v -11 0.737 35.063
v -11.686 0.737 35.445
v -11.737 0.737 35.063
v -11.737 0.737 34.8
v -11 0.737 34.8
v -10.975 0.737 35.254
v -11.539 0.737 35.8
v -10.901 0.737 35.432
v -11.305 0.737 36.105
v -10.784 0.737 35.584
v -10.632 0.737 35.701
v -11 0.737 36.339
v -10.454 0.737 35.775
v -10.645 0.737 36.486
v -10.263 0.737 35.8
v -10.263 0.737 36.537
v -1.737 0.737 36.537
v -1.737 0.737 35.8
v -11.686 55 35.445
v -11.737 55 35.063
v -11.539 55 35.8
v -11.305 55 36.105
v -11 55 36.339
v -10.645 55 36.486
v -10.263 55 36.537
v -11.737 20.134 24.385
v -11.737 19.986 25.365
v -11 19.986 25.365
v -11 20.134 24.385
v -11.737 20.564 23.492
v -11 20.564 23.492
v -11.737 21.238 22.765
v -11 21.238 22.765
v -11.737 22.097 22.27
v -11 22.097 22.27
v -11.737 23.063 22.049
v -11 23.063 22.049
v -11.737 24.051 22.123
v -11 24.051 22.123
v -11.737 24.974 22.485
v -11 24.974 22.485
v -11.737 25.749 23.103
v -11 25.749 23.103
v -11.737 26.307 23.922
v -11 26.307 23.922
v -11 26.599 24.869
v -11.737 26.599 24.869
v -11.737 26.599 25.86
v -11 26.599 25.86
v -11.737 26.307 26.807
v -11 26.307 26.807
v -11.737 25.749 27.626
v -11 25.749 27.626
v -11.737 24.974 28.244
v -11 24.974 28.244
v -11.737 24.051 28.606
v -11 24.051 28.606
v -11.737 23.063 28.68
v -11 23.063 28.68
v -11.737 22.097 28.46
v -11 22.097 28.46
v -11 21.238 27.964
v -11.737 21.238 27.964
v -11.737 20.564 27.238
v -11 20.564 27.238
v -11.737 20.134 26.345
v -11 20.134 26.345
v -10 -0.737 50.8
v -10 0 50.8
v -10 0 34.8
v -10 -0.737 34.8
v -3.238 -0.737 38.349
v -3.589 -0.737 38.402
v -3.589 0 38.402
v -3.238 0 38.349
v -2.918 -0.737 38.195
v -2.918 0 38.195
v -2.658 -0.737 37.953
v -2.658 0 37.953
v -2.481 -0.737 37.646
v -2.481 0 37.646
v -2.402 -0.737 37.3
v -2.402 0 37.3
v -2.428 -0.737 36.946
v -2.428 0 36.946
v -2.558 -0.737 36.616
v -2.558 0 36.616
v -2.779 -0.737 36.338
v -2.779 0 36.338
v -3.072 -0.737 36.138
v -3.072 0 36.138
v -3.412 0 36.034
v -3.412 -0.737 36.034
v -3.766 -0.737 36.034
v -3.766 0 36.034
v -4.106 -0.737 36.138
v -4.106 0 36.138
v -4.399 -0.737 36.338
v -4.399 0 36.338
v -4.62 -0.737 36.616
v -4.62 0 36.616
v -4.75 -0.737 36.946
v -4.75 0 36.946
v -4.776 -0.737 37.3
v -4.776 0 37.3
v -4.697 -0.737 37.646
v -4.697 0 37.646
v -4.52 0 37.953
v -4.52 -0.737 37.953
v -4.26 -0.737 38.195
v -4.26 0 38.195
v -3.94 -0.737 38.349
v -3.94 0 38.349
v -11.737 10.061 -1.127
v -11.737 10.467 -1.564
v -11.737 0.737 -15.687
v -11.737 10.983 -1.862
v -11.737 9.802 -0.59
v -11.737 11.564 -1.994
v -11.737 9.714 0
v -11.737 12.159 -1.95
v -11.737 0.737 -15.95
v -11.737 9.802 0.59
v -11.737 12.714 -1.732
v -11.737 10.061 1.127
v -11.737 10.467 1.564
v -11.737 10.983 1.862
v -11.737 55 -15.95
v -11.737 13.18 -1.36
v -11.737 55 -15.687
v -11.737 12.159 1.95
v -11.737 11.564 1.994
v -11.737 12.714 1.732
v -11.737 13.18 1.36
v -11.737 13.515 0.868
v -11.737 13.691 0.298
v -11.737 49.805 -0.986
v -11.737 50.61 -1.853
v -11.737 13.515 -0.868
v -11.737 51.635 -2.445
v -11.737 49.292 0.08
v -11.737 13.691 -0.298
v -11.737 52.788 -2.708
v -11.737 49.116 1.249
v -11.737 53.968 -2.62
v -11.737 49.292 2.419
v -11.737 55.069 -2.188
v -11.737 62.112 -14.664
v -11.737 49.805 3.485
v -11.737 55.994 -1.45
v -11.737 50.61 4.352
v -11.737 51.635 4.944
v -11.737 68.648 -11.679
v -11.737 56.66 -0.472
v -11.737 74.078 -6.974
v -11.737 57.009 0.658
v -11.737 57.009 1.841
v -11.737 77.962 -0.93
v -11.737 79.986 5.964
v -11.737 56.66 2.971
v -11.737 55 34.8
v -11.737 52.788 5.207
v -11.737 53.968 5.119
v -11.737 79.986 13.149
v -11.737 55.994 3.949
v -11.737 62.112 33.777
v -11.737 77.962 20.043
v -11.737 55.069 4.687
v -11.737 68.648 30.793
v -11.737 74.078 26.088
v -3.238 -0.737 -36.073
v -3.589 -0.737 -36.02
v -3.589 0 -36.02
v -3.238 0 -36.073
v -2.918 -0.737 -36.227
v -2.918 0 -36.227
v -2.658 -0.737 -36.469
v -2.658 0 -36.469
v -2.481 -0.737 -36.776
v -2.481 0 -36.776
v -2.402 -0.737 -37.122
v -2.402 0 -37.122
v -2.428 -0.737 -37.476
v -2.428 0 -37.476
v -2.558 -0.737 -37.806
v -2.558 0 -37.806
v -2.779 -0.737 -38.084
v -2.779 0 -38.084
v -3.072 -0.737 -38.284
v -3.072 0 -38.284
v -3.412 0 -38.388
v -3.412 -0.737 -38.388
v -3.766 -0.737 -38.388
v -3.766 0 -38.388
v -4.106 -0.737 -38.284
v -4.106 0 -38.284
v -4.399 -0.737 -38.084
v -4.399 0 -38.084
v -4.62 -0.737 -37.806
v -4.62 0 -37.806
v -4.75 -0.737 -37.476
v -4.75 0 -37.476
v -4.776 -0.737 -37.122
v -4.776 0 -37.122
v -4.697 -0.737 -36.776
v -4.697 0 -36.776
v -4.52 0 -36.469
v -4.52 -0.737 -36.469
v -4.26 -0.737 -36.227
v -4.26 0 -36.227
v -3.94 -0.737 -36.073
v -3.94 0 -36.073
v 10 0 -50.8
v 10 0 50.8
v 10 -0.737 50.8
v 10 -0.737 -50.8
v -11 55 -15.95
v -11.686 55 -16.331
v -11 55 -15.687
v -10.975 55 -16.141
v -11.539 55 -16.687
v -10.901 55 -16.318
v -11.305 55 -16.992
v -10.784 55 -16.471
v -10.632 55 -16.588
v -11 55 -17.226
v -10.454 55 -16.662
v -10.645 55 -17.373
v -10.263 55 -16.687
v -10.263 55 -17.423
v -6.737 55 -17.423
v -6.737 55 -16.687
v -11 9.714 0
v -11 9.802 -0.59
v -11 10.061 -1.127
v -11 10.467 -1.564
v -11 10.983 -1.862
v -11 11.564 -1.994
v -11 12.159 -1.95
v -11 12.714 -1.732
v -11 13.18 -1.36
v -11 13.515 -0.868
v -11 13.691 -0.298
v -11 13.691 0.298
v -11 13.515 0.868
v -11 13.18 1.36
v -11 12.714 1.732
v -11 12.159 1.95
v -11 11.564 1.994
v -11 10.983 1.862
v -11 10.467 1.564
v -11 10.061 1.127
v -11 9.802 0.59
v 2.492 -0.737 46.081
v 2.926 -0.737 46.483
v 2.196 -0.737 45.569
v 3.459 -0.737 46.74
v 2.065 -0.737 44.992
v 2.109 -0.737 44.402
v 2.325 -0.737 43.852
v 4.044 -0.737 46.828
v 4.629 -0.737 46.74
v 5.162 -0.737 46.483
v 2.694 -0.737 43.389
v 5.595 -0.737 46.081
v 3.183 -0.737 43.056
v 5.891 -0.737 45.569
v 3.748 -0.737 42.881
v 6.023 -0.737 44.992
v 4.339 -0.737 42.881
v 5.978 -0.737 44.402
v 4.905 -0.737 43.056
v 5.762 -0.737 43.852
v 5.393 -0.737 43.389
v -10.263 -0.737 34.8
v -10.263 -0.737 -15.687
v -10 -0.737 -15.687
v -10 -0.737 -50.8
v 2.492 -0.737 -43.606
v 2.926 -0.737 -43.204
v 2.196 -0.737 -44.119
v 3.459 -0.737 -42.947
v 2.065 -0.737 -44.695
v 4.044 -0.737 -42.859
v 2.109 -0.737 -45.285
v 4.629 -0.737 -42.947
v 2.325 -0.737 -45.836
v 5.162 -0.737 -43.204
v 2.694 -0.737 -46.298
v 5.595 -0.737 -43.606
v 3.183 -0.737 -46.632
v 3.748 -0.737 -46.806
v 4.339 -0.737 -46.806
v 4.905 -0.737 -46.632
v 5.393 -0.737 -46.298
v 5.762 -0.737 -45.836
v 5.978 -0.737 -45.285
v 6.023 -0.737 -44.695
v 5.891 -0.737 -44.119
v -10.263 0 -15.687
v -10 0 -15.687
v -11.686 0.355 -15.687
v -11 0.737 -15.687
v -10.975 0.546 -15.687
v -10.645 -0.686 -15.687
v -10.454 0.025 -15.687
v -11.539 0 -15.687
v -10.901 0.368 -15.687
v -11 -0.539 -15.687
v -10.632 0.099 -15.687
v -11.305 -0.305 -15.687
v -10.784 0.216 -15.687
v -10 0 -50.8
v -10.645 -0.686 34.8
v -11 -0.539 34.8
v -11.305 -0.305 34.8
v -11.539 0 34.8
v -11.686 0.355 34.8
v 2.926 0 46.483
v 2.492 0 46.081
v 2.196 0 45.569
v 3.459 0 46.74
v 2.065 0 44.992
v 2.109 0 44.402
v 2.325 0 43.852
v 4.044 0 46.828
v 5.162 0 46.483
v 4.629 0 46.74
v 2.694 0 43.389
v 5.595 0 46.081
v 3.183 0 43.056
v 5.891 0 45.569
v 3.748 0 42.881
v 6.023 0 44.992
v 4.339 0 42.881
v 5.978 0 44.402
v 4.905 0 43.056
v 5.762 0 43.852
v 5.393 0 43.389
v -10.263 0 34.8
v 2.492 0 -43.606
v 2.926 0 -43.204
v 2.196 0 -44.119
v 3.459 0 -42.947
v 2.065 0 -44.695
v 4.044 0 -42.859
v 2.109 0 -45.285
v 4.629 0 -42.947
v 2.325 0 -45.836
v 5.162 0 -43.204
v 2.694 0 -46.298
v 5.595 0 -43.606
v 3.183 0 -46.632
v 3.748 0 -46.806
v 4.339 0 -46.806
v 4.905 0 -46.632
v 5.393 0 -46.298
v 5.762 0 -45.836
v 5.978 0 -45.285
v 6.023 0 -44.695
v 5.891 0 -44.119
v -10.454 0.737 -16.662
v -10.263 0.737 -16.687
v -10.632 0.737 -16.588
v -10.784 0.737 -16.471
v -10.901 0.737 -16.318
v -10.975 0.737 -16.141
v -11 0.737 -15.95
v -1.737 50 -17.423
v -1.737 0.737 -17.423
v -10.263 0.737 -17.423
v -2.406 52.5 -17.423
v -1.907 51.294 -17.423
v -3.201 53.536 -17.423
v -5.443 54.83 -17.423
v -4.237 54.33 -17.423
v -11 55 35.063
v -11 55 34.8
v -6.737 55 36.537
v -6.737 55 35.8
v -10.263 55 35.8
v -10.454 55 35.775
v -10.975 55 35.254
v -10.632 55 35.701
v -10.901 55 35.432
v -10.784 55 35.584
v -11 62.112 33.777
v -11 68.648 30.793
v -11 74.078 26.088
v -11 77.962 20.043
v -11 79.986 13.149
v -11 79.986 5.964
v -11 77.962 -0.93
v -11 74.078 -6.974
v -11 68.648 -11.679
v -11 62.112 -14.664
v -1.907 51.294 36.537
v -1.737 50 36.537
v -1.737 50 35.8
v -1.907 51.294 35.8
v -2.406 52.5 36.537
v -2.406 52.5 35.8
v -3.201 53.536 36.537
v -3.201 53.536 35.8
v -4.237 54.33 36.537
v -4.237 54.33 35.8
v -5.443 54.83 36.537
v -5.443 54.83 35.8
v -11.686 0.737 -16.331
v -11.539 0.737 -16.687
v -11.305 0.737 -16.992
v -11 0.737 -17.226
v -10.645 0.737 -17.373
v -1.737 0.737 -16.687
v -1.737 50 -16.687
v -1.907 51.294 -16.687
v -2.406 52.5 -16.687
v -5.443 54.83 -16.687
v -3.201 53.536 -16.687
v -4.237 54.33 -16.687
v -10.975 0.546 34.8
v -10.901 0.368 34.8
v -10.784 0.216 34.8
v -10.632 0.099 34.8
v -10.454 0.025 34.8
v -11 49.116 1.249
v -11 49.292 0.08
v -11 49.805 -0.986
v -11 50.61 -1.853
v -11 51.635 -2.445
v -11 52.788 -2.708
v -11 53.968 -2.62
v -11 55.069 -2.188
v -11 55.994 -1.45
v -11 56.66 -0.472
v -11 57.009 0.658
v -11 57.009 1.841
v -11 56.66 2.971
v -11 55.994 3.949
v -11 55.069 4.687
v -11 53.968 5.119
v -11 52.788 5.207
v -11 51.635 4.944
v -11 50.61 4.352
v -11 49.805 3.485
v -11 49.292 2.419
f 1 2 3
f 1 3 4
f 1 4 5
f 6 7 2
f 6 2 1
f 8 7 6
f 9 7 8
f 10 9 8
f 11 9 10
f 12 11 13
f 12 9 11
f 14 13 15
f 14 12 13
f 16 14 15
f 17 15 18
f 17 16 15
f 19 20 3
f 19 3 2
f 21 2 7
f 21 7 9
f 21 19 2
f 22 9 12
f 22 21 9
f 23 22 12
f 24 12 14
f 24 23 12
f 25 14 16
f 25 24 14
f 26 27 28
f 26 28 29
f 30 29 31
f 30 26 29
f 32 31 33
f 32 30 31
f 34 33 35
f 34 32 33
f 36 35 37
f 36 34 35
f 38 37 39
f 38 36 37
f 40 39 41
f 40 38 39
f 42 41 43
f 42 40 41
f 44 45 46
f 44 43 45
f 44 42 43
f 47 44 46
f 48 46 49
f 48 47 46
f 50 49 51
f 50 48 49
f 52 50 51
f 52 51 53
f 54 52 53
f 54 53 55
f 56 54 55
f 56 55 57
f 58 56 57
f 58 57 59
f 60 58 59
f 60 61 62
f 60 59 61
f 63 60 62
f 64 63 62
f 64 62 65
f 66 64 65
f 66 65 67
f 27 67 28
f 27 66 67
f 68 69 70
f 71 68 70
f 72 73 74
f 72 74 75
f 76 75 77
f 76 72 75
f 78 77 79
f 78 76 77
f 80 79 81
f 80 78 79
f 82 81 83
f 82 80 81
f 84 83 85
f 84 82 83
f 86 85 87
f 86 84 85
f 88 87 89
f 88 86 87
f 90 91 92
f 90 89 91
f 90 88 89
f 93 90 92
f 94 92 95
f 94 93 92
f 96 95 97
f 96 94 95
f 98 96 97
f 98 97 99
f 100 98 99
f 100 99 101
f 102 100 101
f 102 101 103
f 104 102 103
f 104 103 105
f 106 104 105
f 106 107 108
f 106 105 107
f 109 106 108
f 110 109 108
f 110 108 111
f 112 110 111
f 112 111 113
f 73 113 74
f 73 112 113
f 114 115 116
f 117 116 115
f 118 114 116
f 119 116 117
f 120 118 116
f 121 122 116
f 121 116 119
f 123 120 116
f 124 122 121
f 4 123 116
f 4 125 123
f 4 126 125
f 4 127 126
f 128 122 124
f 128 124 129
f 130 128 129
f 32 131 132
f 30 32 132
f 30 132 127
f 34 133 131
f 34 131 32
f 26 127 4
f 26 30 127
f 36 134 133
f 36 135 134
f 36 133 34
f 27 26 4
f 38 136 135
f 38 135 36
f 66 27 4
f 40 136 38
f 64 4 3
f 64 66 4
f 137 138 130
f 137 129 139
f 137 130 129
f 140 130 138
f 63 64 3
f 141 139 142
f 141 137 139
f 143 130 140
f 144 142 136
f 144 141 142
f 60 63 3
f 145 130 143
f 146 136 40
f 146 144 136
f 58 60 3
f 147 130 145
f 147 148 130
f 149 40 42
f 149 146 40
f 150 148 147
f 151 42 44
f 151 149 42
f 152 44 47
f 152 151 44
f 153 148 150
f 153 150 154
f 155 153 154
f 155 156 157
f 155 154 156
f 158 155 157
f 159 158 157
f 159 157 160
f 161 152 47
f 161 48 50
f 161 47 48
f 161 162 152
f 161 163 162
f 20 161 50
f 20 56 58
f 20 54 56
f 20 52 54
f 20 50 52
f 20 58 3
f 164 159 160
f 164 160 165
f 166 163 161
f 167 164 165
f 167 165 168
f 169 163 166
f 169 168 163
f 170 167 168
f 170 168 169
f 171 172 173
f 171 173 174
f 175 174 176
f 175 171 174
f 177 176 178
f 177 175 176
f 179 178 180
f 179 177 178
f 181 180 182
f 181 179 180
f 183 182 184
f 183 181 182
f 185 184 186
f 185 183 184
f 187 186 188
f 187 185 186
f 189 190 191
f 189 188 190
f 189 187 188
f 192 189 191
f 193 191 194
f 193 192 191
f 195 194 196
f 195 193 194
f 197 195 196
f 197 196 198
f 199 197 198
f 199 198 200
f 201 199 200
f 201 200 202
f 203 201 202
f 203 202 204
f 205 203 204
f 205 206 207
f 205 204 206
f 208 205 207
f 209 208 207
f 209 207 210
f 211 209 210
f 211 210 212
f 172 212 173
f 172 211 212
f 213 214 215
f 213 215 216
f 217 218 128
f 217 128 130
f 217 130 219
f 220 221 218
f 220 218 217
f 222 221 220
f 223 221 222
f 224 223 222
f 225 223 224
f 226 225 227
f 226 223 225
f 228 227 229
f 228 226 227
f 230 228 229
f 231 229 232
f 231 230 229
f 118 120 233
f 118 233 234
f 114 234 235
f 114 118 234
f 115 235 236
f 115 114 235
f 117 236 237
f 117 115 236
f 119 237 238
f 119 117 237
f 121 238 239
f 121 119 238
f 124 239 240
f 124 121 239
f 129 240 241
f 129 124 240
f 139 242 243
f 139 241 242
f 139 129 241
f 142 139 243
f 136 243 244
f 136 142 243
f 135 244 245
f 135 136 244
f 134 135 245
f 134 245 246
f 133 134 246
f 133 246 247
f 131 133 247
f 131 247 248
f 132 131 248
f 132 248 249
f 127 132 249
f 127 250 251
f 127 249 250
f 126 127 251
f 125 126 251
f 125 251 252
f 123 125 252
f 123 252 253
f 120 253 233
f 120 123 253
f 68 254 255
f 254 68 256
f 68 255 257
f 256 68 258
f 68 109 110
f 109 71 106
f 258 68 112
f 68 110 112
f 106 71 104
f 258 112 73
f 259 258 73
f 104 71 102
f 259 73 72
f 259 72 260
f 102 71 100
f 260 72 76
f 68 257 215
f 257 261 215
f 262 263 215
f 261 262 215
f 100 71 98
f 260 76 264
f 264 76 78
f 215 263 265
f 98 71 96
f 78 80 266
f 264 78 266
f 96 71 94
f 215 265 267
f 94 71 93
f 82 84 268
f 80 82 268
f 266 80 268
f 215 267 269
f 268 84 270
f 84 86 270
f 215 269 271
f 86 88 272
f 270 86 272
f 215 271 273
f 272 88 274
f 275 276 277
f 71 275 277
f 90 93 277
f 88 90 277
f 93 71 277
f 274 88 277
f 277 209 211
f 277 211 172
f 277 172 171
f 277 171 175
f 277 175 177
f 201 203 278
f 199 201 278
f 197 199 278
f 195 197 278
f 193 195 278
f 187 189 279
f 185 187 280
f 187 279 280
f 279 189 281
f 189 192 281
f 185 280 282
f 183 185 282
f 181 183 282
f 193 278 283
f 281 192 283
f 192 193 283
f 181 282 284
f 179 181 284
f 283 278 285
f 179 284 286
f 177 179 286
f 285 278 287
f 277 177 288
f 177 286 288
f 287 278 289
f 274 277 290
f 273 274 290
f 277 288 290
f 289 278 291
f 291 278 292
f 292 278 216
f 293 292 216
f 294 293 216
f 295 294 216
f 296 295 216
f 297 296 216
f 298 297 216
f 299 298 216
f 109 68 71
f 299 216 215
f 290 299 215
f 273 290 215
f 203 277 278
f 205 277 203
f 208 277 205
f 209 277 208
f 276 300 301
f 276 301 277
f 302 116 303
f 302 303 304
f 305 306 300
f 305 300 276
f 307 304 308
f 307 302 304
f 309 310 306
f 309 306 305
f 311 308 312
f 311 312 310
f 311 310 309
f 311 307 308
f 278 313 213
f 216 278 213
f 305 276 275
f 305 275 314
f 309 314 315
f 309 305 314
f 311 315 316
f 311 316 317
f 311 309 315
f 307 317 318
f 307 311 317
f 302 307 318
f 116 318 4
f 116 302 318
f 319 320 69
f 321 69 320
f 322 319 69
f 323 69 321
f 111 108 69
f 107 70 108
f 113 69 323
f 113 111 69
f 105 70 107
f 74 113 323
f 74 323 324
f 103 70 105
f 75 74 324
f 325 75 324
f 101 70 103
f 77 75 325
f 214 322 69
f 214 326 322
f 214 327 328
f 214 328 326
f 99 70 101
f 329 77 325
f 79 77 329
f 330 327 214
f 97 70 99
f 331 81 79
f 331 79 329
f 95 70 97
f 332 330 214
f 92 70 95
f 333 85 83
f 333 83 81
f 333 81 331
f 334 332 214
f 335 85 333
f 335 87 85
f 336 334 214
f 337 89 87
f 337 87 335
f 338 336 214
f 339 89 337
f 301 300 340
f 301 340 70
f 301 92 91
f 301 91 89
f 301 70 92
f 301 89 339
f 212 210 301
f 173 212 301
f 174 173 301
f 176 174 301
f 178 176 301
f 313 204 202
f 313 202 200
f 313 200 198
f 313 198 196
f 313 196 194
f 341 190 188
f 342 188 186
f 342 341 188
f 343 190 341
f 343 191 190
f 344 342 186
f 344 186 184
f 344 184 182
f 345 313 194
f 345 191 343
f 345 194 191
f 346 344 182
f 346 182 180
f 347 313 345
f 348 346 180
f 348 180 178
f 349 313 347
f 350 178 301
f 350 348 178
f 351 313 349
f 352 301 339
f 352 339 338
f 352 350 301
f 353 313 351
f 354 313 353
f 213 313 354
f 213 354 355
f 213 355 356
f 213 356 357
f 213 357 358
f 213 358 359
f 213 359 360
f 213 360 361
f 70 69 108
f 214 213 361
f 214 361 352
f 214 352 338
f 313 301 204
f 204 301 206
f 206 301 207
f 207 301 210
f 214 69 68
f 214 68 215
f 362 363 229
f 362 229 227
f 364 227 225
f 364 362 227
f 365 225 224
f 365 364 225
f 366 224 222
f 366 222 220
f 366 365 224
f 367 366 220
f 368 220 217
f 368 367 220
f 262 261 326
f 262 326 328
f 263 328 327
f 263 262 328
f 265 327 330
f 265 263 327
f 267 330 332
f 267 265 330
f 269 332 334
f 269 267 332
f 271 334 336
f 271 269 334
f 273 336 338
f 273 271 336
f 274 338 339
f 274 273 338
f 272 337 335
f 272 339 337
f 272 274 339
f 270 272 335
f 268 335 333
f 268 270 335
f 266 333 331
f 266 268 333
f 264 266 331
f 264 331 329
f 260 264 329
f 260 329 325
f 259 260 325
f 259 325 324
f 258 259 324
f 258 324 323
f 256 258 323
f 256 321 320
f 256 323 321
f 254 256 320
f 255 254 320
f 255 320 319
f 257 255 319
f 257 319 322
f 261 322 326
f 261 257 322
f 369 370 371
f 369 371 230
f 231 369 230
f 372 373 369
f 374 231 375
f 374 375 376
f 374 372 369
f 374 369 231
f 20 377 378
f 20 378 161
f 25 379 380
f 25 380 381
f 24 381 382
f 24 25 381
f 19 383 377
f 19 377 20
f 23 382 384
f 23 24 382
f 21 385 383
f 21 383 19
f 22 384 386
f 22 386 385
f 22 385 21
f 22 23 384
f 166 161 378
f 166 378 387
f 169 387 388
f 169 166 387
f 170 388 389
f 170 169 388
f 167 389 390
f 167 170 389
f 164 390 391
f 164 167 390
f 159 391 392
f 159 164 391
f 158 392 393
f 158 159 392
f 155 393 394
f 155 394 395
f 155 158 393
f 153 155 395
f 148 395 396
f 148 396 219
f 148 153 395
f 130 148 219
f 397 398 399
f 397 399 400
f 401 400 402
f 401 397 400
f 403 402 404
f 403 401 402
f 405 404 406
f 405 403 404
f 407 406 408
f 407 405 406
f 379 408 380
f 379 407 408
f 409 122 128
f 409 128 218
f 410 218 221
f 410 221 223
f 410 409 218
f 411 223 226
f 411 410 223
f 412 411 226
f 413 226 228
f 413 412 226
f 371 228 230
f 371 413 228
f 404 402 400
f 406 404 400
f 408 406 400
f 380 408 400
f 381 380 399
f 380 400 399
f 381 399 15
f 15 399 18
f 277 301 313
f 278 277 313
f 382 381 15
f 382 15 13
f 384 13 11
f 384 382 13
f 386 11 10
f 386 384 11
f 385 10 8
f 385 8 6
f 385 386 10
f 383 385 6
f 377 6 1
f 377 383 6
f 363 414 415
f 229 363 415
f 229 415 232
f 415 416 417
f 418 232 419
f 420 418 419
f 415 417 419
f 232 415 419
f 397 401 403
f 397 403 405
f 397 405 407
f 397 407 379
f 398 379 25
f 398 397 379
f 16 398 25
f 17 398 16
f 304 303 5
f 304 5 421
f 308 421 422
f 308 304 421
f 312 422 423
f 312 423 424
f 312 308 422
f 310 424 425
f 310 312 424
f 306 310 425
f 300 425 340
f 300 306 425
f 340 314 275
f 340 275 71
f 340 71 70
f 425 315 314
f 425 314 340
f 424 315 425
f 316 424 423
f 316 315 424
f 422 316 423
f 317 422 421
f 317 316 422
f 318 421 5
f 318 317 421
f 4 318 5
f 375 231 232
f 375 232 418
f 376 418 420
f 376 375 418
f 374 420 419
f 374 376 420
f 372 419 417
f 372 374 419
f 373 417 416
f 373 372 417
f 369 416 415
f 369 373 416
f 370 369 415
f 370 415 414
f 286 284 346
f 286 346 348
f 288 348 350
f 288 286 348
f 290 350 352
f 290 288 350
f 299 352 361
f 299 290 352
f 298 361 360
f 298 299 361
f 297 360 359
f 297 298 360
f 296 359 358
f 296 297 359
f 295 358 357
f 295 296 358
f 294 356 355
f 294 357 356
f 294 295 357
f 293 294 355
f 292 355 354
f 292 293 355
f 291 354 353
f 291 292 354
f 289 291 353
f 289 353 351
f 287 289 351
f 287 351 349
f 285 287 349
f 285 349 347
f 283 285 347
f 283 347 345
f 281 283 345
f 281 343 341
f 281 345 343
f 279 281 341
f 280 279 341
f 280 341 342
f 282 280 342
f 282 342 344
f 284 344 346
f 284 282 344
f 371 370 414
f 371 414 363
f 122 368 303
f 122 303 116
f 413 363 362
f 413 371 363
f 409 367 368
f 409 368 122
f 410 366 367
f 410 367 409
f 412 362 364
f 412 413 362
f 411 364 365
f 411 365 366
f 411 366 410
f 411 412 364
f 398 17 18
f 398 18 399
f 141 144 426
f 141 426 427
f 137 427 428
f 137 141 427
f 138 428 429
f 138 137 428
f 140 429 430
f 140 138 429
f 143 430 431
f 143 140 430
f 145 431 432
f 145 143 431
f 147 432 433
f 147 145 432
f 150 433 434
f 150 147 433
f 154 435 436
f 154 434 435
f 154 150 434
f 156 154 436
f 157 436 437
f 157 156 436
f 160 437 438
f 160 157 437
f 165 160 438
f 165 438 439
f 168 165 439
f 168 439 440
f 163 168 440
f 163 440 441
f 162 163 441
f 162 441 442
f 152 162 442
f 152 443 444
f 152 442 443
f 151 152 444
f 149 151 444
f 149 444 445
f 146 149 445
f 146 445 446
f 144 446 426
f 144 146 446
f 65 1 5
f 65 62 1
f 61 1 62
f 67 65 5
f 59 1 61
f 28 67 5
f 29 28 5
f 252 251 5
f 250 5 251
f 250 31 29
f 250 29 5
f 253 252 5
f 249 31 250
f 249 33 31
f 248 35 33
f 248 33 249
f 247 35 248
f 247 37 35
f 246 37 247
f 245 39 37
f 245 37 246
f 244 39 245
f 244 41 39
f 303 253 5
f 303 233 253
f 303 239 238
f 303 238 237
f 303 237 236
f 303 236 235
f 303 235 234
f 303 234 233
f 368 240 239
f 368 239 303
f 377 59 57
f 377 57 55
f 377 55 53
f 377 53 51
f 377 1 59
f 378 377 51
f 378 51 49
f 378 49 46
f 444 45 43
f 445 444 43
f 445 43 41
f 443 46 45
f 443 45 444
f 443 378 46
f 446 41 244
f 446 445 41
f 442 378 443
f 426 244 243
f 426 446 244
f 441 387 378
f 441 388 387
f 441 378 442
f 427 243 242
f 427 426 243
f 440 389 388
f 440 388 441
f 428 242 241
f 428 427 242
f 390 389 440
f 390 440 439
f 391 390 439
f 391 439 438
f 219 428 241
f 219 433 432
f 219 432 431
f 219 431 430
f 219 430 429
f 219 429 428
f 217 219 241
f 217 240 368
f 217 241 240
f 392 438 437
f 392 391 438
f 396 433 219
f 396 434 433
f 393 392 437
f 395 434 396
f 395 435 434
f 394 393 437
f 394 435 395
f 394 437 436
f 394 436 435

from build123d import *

# Parameters (mm, degrees)
SKETCH1_W                 = 20
SKETCH1_H                 = 101.6
BASE_FLANGE1_DEPTH        = 0.7366
EDGE_FLANGE1_DEPTH        = 50.486713846
EDGE_FLANGE1_START        = 0.7366
EDGE_FLANGE1_FLAT_DEPTH   = 0.7366
CUT_EXTRUDE1_DEPTH        = 245.392554313
CUT_EXTRUDE1_DEPTH_BACK   = 245.392554313
SKETCH9_R                 = 2
CUT_EXTRUDE3_DEPTH        = 248.026355859
CUT_EXTRUDE3_DEPTH_BACK   = 248.026355859
SKETCH11_R                = 3.96875
CUT_EXTRUDE5_DEPTH        = 199.550344579
CUT_EXTRUDE5_DEPTH_BACK   = 199.550344579
SKETCH13_R                = 1.984375
SKETCH13_R_2              = 1.190625
EDGE_FLANGE2_DEPTH        = 54.2634
EDGE_FLANGE2_START        = 0.7366
EDGE_FLANGE2_FLAT_DEPTH   = 0.7366
EDGE_FLANGE2_BEND_DEPTH   = 54.2634
EDGE_FLANGE2_FLAT_2_DEPTH = 0.7366
CUT_EXTRUDE35_DEPTH       = 251.457429571
CUT_EXTRUDE35_DEPTH_BACK  = 251.457429571
SKETCH50_R                = 3.325000001


# Sheet-metal steps are written as plain solids
with BuildPart() as part:
    # Sketch1 → Base-Flange1 (new body)
    with BuildSketch(Plane(origin=(0, 0, 0), x_dir=(1, 0, 0), z_dir=(0, 1, 0))):
        Rectangle(SKETCH1_W, SKETCH1_H)
    extrude(amount=-BASE_FLANGE1_DEPTH)

    # Edge-Flange1 bend section (across the edge) → Edge-Flange1 (add)
    with BuildSketch(Plane(origin=(-11, 0, -15.686713846), x_dir=(1, 0, 0), z_dir=(0, 0, 1))):
        with BuildLine():
            Line((-0.7366, 0.7366), (0, 0.7366))
            ThreePointArc((0, 0.7366), (0.215745145, 0.215745145), (0.7366, 0))
            Line((0.7366, 0), (1, 0))
            Line((1, 0), (1, -0.7366))
            Line((1, -0.7366), (0.7366, -0.7366))
            ThreePointArc((0.7366, -0.7366), (-0.30510971, -0.30510971), (-0.7366, 0.7366))
        make_face()
    extrude(amount=EDGE_FLANGE1_DEPTH)

    # Edge-Flange1 profile (on flange) → Edge-Flange1 flat (add)
    with BuildSketch(Plane.ZY.offset(11).offset(EDGE_FLANGE1_START)):
        with BuildLine():
            ThreePointArc((34.8, 55), (9.556643077, 80.243356923), (-15.686713846, 55))
            Line((-15.686713846, 55), (-15.686713846, 0.7366))
            Line((-15.686713846, 0.7366), (34.8, 0.7366))
            Line((34.8, 0.7366), (34.8, 55))
        make_face()
    extrude(amount=-EDGE_FLANGE1_FLAT_DEPTH)

    # Sketch9 → Cut-Extrude1 (cut, two sides: drawn at the far end of the back side and taken through both)
    with BuildSketch(Plane(origin=(-48.111610167, -124.793980752, 68.826299478), x_dir=(0, 0, -1), z_dir=(1, 0, 0)).offset(-CUT_EXTRUDE1_DEPTH_BACK)):
        with Locations(Location((68.826299478, 136.507533033, 0), (0, 0, 270))):
            Circle(SKETCH9_R)
    extrude(amount=CUT_EXTRUDE1_DEPTH + CUT_EXTRUDE1_DEPTH_BACK, mode=Mode.SUBTRACT)

    # Sketch11 → Cut-Extrude3 (cut, two sides: drawn at the far end of the back side and taken through both)
    with BuildSketch(Plane(origin=(-58.346610167, -124.793980752, 68.826299478), x_dir=(0, 0, -1), z_dir=(1, 0, 0)).offset(-CUT_EXTRUDE3_DEPTH_BACK)):
        with Locations(Location((67.576820433, 177.878571709, 0), (0, 0, 270))):
            Circle(SKETCH11_R)
    extrude(amount=CUT_EXTRUDE3_DEPTH + CUT_EXTRUDE3_DEPTH_BACK, mode=Mode.SUBTRACT)

    # Sketch13 → Cut-Extrude5 (cut, two sides: drawn at the far end of the back side and taken through both)
    with BuildSketch(Plane(origin=(124.911822879, 0, 68.826299478), x_dir=(-0.7071067811865436, 0, 0.7071067811865515), z_dir=(0, 1, 0)).offset(-CUT_EXTRUDE5_DEPTH_BACK)):
        with Locations(Location((68.508410595, -102.424928038, 0), (0, 0, 45))):
            Circle(SKETCH13_R)
        with Locations(Location((68.508410595, -113.219195896, 0), (0, 0, 45))):
            Circle(SKETCH13_R_2)
        with Locations(Location((5.089841868, -165.843496765, 0), (0, 0, 45))):
            Circle(SKETCH13_R)
        with Locations(Location((15.884109726, -165.843496765, 0), (0, 0, 45))):
            Circle(SKETCH13_R_2)
    extrude(amount=CUT_EXTRUDE5_DEPTH + CUT_EXTRUDE5_DEPTH_BACK, mode=Mode.SUBTRACT)

    # Edge-Flange2 bend section (across the edge) → Edge-Flange2 (add)
    with BuildSketch(Plane(origin=(-11, 0.7366, -16.686713846), x_dir=(0, 0, 1), z_dir=(0, 1, 0))):
        with BuildLine():
            Line((-0.7366, 0.7366), (0, 0.7366))
            ThreePointArc((0, 0.7366), (0.215745145, 0.215745145), (0.7366, 0))
            Line((0.7366, 0), (1, 0))
            Line((1, 0), (1, -0.7366))
            Line((1, -0.7366), (0.7366, -0.7366))
            ThreePointArc((0.7366, -0.7366), (-0.30510971, -0.30510971), (-0.7366, 0.7366))
        make_face()
    extrude(amount=EDGE_FLANGE2_DEPTH)

    # Edge-Flange2 profile (on flange) → Edge-Flange2 flat (add)
    with BuildSketch(Plane(origin=(-11, 0, -16.686713846), x_dir=(0, 1, 0), z_dir=(0, 0, -1)).offset(EDGE_FLANGE2_START)):
        with BuildLine():
            Line((50, 9.2634), (0.7366, 9.2634))
            Line((0.7366, 9.2634), (0.7366, 0.7366))
            Line((0.7366, 0.7366), (55, 0.7366))
            Line((55, 0.7366), (55, 4.2634))
            ThreePointArc((55, 4.2634), (53.535533906, 7.798933906), (50, 9.2634))
        make_face()
    extrude(amount=-EDGE_FLANGE2_FLAT_DEPTH)

    # Edge-Flange2 bend section 2 (across the edge) → Edge-Flange2 bend (add)
    with BuildSketch(Plane(origin=(-11, 55, 35.8), x_dir=(0, 0, -1), z_dir=(0, -1, 0))):
        with BuildLine():
            Line((-0.7366, 0.7366), (0, 0.7366))
            ThreePointArc((0, 0.7366), (0.215745145, 0.215745145), (0.7366, 0))
            Line((0.7366, 0), (1, 0))
            Line((1, 0), (1, -0.7366))
            Line((1, -0.7366), (0.7366, -0.7366))
            ThreePointArc((0.7366, -0.7366), (-0.30510971, -0.30510971), (-0.7366, 0.7366))
        make_face()
    extrude(amount=EDGE_FLANGE2_BEND_DEPTH)

    # Edge-Flange2 profile 2 (on flange) → Edge-Flange2 flat 2 (add)
    with BuildSketch(Plane(origin=(-11, 0, 35.8), x_dir=(0, -1, 0), z_dir=(0, 0, 1)).offset(EDGE_FLANGE2_START)):
        with BuildLine():
            ThreePointArc((-50, 9.2634), (-53.535533906, 7.798933906), (-55, 4.2634))
            Line((-55, 4.2634), (-55, 0.7366))
            Line((-55, 0.7366), (-0.7366, 0.7366))
            Line((-0.7366, 0.7366), (-0.7366, 9.2634))
            Line((-0.7366, 9.2634), (-50, 9.2634))
        make_face()
    extrude(amount=-EDGE_FLANGE2_FLAT_2_DEPTH)

    # Sketch50 → Cut-Extrude35 (cut, two sides: drawn at the far end of the back side and taken through both)
    with BuildSketch(Plane(origin=(-69.8634, -124.793980752, 68.826299478), x_dir=(0, 0, -1), z_dir=(1, 0, 0)).offset(-CUT_EXTRUDE35_DEPTH_BACK)):
        with Locations(Location((43.461576529, 148.105383059, 0), (0, 0, 270))):
            Circle(SKETCH50_R)
    extrude(amount=CUT_EXTRUDE35_DEPTH + CUT_EXTRUDE35_DEPTH_BACK, mode=Mode.SUBTRACT)


solid = part.part
